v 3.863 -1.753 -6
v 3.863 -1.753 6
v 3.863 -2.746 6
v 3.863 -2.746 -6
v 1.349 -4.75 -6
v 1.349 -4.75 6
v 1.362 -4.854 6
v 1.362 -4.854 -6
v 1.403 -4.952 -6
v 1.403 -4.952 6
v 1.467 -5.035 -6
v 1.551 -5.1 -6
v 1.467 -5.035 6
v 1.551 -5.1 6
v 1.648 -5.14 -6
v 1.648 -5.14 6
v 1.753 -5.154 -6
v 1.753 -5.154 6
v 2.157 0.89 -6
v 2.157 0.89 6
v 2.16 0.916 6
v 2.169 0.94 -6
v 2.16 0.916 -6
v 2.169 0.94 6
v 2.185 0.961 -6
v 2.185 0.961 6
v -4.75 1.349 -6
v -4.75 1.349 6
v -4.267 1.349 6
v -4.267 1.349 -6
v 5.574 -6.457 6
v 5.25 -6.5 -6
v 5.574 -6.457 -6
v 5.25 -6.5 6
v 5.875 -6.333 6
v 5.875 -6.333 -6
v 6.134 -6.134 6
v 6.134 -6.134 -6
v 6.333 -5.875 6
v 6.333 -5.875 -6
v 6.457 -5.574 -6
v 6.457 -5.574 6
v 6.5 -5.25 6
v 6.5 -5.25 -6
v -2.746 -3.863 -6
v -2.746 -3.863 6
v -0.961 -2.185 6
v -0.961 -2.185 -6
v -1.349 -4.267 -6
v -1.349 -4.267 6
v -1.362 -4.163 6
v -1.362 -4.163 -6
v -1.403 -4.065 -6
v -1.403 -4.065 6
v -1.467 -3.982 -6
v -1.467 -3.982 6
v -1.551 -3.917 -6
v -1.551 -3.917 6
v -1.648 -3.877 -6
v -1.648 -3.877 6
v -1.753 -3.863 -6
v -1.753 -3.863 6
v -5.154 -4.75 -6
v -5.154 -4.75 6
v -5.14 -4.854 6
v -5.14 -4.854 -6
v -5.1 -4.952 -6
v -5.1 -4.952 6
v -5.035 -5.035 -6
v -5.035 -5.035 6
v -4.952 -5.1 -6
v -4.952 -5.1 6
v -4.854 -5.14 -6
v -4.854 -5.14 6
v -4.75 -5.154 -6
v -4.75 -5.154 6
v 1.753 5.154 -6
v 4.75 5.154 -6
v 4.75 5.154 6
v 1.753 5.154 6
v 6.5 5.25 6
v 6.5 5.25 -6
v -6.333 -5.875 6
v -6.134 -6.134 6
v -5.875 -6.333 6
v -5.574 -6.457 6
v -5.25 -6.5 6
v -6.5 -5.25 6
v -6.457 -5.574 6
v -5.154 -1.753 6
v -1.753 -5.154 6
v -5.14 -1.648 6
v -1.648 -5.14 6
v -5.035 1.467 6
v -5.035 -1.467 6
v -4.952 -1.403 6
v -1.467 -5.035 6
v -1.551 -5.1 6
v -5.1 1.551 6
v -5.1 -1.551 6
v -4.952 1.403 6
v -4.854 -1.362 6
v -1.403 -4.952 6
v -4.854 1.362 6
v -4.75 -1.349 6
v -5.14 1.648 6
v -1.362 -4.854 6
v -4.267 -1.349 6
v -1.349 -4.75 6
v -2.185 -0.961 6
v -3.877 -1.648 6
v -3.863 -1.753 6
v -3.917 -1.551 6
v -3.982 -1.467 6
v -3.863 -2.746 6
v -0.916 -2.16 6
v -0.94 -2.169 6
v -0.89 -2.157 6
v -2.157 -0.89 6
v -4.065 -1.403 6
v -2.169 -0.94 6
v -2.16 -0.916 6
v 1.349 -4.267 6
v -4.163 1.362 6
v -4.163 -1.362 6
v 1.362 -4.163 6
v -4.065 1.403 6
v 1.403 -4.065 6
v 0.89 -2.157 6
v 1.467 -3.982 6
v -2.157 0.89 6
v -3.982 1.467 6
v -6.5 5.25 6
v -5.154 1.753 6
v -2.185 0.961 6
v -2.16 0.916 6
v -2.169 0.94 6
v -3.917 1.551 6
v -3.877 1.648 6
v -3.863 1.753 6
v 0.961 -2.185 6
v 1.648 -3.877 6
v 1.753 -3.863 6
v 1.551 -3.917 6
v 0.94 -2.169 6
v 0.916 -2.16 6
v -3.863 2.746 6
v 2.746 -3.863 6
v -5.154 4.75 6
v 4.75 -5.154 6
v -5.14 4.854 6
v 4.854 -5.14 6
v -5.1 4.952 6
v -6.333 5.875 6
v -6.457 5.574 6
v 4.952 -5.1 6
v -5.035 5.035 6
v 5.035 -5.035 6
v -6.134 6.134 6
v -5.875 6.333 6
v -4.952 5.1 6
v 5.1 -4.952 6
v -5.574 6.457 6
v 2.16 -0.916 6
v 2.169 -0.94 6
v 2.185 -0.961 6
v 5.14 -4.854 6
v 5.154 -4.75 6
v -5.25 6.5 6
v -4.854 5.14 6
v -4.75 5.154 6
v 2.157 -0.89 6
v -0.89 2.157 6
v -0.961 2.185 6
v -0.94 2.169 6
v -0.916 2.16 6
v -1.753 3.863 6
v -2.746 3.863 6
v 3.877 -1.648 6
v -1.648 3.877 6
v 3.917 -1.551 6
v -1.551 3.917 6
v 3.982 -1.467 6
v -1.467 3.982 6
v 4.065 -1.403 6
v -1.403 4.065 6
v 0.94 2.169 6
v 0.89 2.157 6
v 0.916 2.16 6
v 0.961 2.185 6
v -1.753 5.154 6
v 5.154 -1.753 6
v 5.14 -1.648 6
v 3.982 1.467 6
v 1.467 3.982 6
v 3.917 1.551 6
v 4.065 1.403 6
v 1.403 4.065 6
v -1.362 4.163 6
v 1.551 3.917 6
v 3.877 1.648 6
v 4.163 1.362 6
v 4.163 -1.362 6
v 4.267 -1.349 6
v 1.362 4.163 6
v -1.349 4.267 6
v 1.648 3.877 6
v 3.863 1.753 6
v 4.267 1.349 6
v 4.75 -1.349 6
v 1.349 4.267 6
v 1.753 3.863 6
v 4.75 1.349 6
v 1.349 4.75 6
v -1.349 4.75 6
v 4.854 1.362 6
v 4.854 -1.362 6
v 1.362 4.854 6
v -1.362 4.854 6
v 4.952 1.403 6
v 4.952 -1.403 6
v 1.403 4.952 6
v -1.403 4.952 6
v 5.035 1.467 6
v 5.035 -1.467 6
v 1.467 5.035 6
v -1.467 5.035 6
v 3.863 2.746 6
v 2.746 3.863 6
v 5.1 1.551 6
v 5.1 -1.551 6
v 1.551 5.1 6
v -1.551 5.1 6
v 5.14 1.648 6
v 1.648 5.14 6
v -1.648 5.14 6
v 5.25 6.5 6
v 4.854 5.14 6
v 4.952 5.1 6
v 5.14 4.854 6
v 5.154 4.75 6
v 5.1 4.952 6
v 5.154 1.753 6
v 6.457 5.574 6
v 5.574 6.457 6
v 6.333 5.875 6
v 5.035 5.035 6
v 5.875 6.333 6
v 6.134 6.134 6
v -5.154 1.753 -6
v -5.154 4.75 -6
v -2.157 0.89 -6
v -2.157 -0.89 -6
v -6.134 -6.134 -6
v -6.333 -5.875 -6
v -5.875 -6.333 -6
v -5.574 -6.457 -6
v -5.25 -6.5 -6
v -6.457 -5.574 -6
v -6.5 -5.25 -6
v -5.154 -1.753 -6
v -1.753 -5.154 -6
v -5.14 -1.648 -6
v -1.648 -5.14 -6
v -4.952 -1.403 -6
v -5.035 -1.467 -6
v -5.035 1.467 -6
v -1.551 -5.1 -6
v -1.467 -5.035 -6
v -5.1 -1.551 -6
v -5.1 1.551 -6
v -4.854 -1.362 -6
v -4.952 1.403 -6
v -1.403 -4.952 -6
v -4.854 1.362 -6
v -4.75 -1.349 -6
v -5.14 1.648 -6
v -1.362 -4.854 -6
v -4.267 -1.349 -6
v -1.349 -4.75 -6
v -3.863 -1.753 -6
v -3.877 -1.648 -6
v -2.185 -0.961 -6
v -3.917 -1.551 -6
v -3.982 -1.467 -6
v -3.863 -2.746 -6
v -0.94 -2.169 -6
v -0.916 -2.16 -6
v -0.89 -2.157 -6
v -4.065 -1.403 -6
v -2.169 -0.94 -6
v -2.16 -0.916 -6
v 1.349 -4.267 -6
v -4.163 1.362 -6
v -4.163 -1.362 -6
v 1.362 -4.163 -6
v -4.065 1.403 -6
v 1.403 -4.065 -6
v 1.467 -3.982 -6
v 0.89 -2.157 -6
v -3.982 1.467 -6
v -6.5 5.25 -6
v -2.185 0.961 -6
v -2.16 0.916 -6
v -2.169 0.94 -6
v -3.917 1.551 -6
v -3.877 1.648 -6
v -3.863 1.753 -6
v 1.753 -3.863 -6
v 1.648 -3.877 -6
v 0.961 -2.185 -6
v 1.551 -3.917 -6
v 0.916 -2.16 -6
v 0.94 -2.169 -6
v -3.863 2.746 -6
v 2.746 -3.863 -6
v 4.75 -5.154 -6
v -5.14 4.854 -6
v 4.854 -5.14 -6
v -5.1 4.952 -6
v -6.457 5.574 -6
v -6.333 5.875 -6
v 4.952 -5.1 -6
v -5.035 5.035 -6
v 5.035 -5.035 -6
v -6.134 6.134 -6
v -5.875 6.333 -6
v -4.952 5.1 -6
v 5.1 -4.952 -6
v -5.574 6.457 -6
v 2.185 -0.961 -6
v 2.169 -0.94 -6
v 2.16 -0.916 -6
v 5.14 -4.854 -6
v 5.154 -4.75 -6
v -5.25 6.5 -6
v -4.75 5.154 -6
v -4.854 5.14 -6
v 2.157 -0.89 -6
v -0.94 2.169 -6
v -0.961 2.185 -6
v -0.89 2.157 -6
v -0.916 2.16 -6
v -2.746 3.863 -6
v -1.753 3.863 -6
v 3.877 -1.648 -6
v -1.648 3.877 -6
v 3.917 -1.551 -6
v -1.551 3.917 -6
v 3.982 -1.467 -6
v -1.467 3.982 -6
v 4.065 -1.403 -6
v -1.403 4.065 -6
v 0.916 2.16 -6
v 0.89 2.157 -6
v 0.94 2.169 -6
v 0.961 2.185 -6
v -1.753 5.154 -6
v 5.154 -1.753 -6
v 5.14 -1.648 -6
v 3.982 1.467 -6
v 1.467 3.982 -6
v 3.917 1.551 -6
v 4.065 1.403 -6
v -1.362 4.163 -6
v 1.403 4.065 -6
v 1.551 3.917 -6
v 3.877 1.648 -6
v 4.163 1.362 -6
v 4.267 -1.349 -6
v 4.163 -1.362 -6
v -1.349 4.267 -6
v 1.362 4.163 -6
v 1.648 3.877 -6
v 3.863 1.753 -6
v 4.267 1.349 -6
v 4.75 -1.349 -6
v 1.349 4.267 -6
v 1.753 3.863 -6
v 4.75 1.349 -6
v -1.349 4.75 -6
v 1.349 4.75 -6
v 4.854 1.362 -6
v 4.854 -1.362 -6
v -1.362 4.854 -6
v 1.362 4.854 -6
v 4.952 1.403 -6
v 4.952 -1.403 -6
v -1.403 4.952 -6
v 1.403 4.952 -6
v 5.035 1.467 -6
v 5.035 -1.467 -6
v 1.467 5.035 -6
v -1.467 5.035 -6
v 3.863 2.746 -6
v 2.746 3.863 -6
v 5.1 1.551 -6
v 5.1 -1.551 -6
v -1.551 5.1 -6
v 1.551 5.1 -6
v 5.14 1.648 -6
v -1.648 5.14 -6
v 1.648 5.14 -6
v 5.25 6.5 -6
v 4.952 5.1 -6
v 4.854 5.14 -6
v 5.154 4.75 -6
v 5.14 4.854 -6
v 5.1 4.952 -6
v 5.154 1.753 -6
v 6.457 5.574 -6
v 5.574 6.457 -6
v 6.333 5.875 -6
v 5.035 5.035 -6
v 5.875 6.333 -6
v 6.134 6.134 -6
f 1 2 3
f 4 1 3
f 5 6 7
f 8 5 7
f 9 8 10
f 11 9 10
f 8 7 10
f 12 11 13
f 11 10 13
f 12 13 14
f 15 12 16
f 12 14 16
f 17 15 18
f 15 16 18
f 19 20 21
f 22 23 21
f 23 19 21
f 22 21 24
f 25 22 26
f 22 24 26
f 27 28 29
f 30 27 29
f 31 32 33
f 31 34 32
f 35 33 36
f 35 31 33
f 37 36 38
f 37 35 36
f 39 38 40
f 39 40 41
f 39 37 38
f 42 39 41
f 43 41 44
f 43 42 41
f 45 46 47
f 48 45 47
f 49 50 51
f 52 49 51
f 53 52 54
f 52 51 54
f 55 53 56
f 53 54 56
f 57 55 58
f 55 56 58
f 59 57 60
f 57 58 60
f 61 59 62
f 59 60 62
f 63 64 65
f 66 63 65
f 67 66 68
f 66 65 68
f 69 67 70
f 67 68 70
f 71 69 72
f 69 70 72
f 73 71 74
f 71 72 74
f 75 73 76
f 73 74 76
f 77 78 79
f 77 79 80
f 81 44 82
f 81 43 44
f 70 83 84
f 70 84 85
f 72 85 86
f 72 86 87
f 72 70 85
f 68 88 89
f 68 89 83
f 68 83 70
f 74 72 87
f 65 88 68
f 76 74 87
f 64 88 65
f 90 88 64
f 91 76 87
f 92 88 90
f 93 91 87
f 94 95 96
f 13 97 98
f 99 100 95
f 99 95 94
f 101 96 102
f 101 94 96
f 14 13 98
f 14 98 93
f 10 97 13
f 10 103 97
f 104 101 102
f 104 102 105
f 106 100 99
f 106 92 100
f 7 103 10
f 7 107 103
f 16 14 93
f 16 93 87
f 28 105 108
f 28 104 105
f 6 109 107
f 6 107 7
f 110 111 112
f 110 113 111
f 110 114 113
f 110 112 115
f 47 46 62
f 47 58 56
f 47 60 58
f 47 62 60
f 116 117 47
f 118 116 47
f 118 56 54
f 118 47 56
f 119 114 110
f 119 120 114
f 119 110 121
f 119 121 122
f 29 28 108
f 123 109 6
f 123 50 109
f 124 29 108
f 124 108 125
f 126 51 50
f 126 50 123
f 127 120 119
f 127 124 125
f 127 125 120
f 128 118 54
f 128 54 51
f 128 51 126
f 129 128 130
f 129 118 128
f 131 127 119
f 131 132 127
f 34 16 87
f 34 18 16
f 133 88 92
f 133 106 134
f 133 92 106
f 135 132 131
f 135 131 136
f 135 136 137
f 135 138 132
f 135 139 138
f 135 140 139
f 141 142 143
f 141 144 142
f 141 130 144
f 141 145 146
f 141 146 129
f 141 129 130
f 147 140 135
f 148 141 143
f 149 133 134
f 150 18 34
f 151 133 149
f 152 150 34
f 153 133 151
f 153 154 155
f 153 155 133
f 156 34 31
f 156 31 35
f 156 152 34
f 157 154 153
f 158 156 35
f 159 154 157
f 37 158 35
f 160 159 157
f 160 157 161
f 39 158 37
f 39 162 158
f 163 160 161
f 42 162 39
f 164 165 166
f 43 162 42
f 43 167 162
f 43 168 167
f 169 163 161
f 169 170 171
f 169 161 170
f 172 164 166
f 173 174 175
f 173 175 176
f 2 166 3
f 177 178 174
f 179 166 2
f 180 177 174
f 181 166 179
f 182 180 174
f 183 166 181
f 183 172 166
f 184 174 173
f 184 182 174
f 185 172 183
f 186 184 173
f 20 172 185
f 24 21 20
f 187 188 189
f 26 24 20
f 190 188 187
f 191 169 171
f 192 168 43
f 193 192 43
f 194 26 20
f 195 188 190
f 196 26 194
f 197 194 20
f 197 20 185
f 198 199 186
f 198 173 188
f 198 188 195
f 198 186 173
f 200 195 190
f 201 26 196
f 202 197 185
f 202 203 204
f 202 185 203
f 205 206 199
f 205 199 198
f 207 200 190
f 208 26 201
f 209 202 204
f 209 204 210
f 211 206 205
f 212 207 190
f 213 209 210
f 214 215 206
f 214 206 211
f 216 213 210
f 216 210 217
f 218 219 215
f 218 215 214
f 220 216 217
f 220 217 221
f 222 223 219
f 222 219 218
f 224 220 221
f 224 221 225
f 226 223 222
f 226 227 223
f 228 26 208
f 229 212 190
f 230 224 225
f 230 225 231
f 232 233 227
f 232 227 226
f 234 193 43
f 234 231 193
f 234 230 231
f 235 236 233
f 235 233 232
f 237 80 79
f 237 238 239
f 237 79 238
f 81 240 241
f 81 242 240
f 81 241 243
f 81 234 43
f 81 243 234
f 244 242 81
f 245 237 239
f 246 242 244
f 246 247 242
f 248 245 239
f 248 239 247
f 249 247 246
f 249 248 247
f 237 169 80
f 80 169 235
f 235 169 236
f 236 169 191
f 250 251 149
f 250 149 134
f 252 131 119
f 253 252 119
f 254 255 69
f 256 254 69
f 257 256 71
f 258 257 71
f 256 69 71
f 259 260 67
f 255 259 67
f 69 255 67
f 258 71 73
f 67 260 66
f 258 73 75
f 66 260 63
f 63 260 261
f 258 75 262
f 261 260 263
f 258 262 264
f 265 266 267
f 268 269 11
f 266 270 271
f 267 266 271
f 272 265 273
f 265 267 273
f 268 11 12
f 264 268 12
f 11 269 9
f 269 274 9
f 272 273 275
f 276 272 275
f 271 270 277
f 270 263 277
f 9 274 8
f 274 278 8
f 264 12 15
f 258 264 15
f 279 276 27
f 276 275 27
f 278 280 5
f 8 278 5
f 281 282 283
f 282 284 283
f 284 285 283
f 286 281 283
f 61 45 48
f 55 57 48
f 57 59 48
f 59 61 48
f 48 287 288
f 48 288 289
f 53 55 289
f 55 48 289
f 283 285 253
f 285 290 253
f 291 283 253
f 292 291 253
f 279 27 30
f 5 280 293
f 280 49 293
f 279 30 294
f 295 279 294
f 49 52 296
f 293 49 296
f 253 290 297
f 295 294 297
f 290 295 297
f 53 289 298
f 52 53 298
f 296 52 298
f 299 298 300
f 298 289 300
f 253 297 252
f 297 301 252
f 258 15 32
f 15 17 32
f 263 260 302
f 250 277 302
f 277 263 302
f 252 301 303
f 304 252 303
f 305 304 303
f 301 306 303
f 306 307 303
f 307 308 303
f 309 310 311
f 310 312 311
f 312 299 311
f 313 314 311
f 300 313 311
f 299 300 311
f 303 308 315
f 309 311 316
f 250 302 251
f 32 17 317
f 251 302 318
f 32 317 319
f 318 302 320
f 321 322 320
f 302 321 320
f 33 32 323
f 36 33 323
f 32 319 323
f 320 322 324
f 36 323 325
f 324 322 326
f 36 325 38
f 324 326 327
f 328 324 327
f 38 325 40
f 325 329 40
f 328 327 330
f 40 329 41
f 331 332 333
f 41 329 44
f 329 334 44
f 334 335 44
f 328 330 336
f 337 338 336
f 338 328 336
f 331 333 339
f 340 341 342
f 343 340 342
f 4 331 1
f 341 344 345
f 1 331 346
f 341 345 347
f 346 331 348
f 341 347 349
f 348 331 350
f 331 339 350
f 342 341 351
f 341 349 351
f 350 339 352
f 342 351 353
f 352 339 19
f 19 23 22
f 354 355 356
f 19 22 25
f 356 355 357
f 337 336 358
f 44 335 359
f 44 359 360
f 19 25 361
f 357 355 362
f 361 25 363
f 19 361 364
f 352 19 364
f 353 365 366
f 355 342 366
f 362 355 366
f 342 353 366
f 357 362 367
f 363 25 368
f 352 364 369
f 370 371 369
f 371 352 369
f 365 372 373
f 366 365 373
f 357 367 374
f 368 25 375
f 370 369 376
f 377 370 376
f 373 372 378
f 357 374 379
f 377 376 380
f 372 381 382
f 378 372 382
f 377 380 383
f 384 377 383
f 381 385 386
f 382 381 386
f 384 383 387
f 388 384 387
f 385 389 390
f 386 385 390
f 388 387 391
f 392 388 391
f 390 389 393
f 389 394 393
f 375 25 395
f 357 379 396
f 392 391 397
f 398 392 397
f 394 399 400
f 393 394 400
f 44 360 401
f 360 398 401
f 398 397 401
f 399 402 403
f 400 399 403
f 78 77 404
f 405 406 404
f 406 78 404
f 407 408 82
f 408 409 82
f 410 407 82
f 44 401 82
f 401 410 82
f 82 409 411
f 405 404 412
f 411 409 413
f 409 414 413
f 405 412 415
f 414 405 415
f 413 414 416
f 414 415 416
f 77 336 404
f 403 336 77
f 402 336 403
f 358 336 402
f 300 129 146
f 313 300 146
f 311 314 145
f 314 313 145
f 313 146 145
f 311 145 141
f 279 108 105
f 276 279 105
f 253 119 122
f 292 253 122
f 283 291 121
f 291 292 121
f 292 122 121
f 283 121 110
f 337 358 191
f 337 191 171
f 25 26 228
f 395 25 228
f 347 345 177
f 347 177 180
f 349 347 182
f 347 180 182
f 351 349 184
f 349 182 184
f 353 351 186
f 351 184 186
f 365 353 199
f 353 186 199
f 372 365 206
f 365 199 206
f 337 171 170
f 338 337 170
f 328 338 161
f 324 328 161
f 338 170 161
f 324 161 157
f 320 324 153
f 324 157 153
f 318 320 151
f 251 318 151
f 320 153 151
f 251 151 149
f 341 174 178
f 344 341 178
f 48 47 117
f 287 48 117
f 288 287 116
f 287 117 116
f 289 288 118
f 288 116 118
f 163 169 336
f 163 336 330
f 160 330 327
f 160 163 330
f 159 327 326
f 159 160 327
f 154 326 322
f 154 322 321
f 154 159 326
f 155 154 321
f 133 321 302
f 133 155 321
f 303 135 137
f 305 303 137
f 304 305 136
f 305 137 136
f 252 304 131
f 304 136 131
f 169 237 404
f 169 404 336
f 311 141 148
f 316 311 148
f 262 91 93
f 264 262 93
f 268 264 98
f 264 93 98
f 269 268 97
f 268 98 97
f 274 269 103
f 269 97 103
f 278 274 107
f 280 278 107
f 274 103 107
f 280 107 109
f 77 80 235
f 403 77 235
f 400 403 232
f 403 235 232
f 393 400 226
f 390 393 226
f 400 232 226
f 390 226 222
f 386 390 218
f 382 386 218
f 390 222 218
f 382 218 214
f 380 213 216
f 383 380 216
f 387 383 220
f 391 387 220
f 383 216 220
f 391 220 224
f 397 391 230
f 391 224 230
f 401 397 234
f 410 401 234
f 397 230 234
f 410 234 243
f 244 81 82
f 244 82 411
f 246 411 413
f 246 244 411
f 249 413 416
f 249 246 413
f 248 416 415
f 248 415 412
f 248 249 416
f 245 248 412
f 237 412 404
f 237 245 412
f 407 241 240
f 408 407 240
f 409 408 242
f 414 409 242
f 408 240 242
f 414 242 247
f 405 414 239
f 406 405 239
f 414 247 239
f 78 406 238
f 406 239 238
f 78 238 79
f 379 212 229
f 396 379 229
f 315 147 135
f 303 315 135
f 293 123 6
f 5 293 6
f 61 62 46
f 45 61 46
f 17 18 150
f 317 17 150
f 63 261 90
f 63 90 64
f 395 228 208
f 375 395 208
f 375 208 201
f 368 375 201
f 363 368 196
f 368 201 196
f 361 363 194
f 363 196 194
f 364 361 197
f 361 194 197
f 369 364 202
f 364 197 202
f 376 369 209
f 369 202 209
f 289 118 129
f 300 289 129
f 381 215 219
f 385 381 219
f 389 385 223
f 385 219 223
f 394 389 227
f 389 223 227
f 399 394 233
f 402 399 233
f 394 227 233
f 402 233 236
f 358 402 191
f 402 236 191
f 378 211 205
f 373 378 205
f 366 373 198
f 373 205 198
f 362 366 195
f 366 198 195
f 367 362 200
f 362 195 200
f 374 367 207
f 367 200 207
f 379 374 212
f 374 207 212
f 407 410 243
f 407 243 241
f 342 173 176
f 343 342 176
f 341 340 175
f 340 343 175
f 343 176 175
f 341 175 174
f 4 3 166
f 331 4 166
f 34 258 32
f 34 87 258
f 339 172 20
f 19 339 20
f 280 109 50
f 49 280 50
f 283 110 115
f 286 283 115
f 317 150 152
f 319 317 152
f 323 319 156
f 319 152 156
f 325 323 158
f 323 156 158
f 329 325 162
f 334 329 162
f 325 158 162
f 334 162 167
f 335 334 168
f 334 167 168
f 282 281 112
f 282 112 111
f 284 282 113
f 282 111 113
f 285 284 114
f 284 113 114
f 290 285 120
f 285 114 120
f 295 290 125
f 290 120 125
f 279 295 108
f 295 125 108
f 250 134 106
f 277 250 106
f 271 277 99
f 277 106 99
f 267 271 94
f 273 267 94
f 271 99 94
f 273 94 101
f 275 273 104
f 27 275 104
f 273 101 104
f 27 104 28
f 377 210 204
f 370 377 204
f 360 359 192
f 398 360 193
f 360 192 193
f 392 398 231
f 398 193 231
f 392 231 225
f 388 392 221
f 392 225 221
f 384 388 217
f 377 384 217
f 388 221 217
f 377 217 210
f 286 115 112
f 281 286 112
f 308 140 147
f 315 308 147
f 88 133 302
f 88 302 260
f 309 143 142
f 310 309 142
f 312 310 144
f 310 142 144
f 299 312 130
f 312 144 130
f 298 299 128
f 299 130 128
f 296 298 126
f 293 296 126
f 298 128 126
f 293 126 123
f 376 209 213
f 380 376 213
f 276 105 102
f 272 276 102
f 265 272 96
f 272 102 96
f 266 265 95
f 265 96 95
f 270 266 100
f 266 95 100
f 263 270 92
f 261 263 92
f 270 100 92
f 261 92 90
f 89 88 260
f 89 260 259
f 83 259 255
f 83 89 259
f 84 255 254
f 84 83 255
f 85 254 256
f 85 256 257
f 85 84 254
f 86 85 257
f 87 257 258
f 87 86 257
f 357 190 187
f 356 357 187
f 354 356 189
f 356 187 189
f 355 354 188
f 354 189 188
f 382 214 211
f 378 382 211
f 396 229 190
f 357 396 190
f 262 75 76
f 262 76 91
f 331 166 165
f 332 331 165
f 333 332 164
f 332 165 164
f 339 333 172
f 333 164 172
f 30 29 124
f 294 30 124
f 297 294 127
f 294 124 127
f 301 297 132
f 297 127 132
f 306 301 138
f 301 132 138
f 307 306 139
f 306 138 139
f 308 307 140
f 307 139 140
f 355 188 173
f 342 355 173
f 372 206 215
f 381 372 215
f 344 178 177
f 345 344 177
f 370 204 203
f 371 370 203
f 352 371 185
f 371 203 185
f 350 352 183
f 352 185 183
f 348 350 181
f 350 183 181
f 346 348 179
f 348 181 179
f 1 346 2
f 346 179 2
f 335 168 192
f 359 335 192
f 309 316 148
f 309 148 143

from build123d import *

# Parameters (mm, degrees)
F1_DEPTH = 6
F3_DEPTH = 10


with BuildPart() as f1:
    # F0 (on Top) → F1 (new body, symmetric)
    with BuildSketch(Plane.XY):
        with BuildLine():
            Line((6.5, -5.25), (6.5, 5.25))
            ThreePointArc((6.5, 5.25), (6.133883, 6.133883), (5.25, 6.5))
            Line((5.25, 6.5), (-5.25, 6.5))
            ThreePointArc((-5.25, 6.5), (-6.133883, 6.133883), (-6.5, 5.25))
            Line((-6.5, 5.25), (-6.5, -5.25))
            ThreePointArc((-6.5, -5.25), (-6.133883, -6.133883), (-5.25, -6.5))
            Line((-5.25, -6.5), (5.25, -6.5))
            ThreePointArc((5.25, -6.5), (6.133883, -6.133883), (6.5, -5.25))
        make_face()
    extrude(amount=F1_DEPTH, both=True)

    # F2 (on Top) → F3 (cut, symmetric)
    with BuildSketch(Plane.XY):
        with BuildLine():
            ThreePointArc((0.889914, -2.1566), (0.928239, -2.163918), (0.961171, -2.184843))
            Line((0.961171, -2.184843), (2.745753, -3.863205))
            Line((2.745753, -3.863205), (1.752595, -3.863205))
            ThreePointArc((1.752595, -3.863205), (1.466924, -3.981534), (1.348595, -4.267205))
            Line((1.348595, -4.267205), (1.348595, -4.749805))
            ThreePointArc((1.348595, -4.749805), (1.466924, -5.035476), (1.752595, -5.153805))
            Line((1.752595, -5.153805), (4.749795, -5.153805))
            ThreePointArc((4.749795, -5.153805), (5.035466, -5.035476), (5.153795, -4.749805))
            Line((5.153795, -4.749805), (5.153795, -1.752605))
            ThreePointArc((5.153795, -1.752605), (5.035471, -1.466932), (4.749802, -1.348599))
            Line((4.749802, -1.348599), (4.267202, -1.348599))
            ThreePointArc((4.267202, -1.348599), (3.981531, -1.466927), (3.863202, -1.752599))
            Line((3.863202, -1.752599), (3.863202, -2.745756))
            Line((3.863202, -2.745756), (2.184831, -0.961164))
            ThreePointArc((2.184831, -0.961164), (2.163912, -0.928237), (2.156595, -0.889919))
            Line((2.156595, -0.889919), (2.156595, 0.889909))
            ThreePointArc((2.156595, 0.889909), (2.163912, 0.928229), (2.184834, 0.961157))
            Line((2.184834, 0.961157), (3.863202, 2.745746))
            Line((3.863202, 2.745746), (3.863202, 1.752589))
            ThreePointArc((3.863202, 1.752589), (3.981531, 1.466917), (4.267202, 1.348589))
            Line((4.267202, 1.348589), (4.749802, 1.348589))
            ThreePointArc((4.749802, 1.348589), (5.035473, 1.466917), (5.153802, 1.752589))
            Line((5.153802, 1.752589), (5.153802, 4.749789))
            ThreePointArc((5.153802, 4.749789), (5.035477, 5.035475), (4.749794, 5.153807))
            Line((4.749794, 5.153807), (1.752594, 5.153807))
            ThreePointArc((1.752594, 5.153807), (1.466922, 5.035478), (1.348594, 4.749807))
            Line((1.348594, 4.749807), (1.348594, 4.267207))
            ThreePointArc((1.348594, 4.267207), (1.466922, 3.981536), (1.752594, 3.863207))
            Line((1.752594, 3.863207), (2.745751, 3.863207))
            Line((2.745751, 3.863207), (0.961159, 2.184836))
            ThreePointArc((0.961159, 2.184836), (0.928232, 2.163916), (0.889914, 2.1566))
            Line((0.889914, 2.1566), (-0.889914, 2.1566))
            ThreePointArc((-0.889914, 2.1566), (-0.928238, 2.163918), (-0.961169, 2.184841))
            Line((-0.961169, 2.184841), (-2.745757, 3.863209))
            Line((-2.745757, 3.863209), (-1.7526, 3.863209))
            ThreePointArc((-1.7526, 3.863209), (-1.466929, 3.981538), (-1.3486, 4.267209))
            Line((-1.3486, 4.267209), (-1.3486, 4.749809))
            ThreePointArc((-1.3486, 4.749809), (-1.466937, 5.035473), (-1.752607, 5.153794))
            Line((-1.752607, 5.153794), (-4.749807, 5.153794))
            ThreePointArc((-4.749807, 5.153794), (-5.035478, 5.035465), (-5.153807, 4.749794))
            Line((-5.153807, 4.749794), (-5.153807, 1.752594))
            ThreePointArc((-5.153807, 1.752594), (-5.035478, 1.466922), (-4.749807, 1.348594))
            Line((-4.749807, 1.348594), (-4.267207, 1.348594))
            ThreePointArc((-4.267207, 1.348594), (-3.981536, 1.466922), (-3.863207, 1.752594))
            Line((-3.863207, 1.752594), (-3.863207, 2.745751))
            Line((-3.863207, 2.745751), (-2.184836, 0.961159))
            ThreePointArc((-2.184836, 0.961159), (-2.163916, 0.928232), (-2.1566, 0.889914))
            Line((-2.1566, 0.889914), (-2.1566, -0.889914))
            ThreePointArc((-2.1566, -0.889914), (-2.163918, -0.928238), (-2.184841, -0.961169))
            Line((-2.184841, -0.961169), (-3.863209, -2.745757))
            Line((-3.863209, -2.745757), (-3.863209, -1.7526))
            ThreePointArc((-3.863209, -1.7526), (-3.981538, -1.466929), (-4.267209, -1.3486))
            Line((-4.267209, -1.3486), (-4.749809, -1.3486))
            ThreePointArc((-4.749809, -1.3486), (-5.035481, -1.466929), (-5.153809, -1.7526))
            Line((-5.153809, -1.7526), (-5.153809, -4.7498))
            ThreePointArc((-5.153809, -4.7498), (-5.035481, -5.035471), (-4.749809, -5.1538))
            Line((-4.749809, -5.1538), (-1.752609, -5.1538))
            ThreePointArc((-1.752609, -5.1538), (-1.466938, -5.035471), (-1.348609, -4.7498))
            Line((-1.348609, -4.7498), (-1.348609, -4.2672))
            ThreePointArc((-1.348609, -4.2672), (-1.466935, -3.981539), (-1.752594, -3.863207))
            Line((-1.752594, -3.863207), (-2.745751, -3.863207))
            Line((-2.745751, -3.863207), (-0.961159, -2.184836))
            ThreePointArc((-0.961159, -2.184836), (-0.928232, -2.163916), (-0.889914, -2.1566))
            Line((-0.889914, -2.1566), (0.889914, -2.1566))
        make_face()
    extrude(amount=F3_DEPTH, both=True, mode=Mode.SUBTRACT)


solid = f1.part
